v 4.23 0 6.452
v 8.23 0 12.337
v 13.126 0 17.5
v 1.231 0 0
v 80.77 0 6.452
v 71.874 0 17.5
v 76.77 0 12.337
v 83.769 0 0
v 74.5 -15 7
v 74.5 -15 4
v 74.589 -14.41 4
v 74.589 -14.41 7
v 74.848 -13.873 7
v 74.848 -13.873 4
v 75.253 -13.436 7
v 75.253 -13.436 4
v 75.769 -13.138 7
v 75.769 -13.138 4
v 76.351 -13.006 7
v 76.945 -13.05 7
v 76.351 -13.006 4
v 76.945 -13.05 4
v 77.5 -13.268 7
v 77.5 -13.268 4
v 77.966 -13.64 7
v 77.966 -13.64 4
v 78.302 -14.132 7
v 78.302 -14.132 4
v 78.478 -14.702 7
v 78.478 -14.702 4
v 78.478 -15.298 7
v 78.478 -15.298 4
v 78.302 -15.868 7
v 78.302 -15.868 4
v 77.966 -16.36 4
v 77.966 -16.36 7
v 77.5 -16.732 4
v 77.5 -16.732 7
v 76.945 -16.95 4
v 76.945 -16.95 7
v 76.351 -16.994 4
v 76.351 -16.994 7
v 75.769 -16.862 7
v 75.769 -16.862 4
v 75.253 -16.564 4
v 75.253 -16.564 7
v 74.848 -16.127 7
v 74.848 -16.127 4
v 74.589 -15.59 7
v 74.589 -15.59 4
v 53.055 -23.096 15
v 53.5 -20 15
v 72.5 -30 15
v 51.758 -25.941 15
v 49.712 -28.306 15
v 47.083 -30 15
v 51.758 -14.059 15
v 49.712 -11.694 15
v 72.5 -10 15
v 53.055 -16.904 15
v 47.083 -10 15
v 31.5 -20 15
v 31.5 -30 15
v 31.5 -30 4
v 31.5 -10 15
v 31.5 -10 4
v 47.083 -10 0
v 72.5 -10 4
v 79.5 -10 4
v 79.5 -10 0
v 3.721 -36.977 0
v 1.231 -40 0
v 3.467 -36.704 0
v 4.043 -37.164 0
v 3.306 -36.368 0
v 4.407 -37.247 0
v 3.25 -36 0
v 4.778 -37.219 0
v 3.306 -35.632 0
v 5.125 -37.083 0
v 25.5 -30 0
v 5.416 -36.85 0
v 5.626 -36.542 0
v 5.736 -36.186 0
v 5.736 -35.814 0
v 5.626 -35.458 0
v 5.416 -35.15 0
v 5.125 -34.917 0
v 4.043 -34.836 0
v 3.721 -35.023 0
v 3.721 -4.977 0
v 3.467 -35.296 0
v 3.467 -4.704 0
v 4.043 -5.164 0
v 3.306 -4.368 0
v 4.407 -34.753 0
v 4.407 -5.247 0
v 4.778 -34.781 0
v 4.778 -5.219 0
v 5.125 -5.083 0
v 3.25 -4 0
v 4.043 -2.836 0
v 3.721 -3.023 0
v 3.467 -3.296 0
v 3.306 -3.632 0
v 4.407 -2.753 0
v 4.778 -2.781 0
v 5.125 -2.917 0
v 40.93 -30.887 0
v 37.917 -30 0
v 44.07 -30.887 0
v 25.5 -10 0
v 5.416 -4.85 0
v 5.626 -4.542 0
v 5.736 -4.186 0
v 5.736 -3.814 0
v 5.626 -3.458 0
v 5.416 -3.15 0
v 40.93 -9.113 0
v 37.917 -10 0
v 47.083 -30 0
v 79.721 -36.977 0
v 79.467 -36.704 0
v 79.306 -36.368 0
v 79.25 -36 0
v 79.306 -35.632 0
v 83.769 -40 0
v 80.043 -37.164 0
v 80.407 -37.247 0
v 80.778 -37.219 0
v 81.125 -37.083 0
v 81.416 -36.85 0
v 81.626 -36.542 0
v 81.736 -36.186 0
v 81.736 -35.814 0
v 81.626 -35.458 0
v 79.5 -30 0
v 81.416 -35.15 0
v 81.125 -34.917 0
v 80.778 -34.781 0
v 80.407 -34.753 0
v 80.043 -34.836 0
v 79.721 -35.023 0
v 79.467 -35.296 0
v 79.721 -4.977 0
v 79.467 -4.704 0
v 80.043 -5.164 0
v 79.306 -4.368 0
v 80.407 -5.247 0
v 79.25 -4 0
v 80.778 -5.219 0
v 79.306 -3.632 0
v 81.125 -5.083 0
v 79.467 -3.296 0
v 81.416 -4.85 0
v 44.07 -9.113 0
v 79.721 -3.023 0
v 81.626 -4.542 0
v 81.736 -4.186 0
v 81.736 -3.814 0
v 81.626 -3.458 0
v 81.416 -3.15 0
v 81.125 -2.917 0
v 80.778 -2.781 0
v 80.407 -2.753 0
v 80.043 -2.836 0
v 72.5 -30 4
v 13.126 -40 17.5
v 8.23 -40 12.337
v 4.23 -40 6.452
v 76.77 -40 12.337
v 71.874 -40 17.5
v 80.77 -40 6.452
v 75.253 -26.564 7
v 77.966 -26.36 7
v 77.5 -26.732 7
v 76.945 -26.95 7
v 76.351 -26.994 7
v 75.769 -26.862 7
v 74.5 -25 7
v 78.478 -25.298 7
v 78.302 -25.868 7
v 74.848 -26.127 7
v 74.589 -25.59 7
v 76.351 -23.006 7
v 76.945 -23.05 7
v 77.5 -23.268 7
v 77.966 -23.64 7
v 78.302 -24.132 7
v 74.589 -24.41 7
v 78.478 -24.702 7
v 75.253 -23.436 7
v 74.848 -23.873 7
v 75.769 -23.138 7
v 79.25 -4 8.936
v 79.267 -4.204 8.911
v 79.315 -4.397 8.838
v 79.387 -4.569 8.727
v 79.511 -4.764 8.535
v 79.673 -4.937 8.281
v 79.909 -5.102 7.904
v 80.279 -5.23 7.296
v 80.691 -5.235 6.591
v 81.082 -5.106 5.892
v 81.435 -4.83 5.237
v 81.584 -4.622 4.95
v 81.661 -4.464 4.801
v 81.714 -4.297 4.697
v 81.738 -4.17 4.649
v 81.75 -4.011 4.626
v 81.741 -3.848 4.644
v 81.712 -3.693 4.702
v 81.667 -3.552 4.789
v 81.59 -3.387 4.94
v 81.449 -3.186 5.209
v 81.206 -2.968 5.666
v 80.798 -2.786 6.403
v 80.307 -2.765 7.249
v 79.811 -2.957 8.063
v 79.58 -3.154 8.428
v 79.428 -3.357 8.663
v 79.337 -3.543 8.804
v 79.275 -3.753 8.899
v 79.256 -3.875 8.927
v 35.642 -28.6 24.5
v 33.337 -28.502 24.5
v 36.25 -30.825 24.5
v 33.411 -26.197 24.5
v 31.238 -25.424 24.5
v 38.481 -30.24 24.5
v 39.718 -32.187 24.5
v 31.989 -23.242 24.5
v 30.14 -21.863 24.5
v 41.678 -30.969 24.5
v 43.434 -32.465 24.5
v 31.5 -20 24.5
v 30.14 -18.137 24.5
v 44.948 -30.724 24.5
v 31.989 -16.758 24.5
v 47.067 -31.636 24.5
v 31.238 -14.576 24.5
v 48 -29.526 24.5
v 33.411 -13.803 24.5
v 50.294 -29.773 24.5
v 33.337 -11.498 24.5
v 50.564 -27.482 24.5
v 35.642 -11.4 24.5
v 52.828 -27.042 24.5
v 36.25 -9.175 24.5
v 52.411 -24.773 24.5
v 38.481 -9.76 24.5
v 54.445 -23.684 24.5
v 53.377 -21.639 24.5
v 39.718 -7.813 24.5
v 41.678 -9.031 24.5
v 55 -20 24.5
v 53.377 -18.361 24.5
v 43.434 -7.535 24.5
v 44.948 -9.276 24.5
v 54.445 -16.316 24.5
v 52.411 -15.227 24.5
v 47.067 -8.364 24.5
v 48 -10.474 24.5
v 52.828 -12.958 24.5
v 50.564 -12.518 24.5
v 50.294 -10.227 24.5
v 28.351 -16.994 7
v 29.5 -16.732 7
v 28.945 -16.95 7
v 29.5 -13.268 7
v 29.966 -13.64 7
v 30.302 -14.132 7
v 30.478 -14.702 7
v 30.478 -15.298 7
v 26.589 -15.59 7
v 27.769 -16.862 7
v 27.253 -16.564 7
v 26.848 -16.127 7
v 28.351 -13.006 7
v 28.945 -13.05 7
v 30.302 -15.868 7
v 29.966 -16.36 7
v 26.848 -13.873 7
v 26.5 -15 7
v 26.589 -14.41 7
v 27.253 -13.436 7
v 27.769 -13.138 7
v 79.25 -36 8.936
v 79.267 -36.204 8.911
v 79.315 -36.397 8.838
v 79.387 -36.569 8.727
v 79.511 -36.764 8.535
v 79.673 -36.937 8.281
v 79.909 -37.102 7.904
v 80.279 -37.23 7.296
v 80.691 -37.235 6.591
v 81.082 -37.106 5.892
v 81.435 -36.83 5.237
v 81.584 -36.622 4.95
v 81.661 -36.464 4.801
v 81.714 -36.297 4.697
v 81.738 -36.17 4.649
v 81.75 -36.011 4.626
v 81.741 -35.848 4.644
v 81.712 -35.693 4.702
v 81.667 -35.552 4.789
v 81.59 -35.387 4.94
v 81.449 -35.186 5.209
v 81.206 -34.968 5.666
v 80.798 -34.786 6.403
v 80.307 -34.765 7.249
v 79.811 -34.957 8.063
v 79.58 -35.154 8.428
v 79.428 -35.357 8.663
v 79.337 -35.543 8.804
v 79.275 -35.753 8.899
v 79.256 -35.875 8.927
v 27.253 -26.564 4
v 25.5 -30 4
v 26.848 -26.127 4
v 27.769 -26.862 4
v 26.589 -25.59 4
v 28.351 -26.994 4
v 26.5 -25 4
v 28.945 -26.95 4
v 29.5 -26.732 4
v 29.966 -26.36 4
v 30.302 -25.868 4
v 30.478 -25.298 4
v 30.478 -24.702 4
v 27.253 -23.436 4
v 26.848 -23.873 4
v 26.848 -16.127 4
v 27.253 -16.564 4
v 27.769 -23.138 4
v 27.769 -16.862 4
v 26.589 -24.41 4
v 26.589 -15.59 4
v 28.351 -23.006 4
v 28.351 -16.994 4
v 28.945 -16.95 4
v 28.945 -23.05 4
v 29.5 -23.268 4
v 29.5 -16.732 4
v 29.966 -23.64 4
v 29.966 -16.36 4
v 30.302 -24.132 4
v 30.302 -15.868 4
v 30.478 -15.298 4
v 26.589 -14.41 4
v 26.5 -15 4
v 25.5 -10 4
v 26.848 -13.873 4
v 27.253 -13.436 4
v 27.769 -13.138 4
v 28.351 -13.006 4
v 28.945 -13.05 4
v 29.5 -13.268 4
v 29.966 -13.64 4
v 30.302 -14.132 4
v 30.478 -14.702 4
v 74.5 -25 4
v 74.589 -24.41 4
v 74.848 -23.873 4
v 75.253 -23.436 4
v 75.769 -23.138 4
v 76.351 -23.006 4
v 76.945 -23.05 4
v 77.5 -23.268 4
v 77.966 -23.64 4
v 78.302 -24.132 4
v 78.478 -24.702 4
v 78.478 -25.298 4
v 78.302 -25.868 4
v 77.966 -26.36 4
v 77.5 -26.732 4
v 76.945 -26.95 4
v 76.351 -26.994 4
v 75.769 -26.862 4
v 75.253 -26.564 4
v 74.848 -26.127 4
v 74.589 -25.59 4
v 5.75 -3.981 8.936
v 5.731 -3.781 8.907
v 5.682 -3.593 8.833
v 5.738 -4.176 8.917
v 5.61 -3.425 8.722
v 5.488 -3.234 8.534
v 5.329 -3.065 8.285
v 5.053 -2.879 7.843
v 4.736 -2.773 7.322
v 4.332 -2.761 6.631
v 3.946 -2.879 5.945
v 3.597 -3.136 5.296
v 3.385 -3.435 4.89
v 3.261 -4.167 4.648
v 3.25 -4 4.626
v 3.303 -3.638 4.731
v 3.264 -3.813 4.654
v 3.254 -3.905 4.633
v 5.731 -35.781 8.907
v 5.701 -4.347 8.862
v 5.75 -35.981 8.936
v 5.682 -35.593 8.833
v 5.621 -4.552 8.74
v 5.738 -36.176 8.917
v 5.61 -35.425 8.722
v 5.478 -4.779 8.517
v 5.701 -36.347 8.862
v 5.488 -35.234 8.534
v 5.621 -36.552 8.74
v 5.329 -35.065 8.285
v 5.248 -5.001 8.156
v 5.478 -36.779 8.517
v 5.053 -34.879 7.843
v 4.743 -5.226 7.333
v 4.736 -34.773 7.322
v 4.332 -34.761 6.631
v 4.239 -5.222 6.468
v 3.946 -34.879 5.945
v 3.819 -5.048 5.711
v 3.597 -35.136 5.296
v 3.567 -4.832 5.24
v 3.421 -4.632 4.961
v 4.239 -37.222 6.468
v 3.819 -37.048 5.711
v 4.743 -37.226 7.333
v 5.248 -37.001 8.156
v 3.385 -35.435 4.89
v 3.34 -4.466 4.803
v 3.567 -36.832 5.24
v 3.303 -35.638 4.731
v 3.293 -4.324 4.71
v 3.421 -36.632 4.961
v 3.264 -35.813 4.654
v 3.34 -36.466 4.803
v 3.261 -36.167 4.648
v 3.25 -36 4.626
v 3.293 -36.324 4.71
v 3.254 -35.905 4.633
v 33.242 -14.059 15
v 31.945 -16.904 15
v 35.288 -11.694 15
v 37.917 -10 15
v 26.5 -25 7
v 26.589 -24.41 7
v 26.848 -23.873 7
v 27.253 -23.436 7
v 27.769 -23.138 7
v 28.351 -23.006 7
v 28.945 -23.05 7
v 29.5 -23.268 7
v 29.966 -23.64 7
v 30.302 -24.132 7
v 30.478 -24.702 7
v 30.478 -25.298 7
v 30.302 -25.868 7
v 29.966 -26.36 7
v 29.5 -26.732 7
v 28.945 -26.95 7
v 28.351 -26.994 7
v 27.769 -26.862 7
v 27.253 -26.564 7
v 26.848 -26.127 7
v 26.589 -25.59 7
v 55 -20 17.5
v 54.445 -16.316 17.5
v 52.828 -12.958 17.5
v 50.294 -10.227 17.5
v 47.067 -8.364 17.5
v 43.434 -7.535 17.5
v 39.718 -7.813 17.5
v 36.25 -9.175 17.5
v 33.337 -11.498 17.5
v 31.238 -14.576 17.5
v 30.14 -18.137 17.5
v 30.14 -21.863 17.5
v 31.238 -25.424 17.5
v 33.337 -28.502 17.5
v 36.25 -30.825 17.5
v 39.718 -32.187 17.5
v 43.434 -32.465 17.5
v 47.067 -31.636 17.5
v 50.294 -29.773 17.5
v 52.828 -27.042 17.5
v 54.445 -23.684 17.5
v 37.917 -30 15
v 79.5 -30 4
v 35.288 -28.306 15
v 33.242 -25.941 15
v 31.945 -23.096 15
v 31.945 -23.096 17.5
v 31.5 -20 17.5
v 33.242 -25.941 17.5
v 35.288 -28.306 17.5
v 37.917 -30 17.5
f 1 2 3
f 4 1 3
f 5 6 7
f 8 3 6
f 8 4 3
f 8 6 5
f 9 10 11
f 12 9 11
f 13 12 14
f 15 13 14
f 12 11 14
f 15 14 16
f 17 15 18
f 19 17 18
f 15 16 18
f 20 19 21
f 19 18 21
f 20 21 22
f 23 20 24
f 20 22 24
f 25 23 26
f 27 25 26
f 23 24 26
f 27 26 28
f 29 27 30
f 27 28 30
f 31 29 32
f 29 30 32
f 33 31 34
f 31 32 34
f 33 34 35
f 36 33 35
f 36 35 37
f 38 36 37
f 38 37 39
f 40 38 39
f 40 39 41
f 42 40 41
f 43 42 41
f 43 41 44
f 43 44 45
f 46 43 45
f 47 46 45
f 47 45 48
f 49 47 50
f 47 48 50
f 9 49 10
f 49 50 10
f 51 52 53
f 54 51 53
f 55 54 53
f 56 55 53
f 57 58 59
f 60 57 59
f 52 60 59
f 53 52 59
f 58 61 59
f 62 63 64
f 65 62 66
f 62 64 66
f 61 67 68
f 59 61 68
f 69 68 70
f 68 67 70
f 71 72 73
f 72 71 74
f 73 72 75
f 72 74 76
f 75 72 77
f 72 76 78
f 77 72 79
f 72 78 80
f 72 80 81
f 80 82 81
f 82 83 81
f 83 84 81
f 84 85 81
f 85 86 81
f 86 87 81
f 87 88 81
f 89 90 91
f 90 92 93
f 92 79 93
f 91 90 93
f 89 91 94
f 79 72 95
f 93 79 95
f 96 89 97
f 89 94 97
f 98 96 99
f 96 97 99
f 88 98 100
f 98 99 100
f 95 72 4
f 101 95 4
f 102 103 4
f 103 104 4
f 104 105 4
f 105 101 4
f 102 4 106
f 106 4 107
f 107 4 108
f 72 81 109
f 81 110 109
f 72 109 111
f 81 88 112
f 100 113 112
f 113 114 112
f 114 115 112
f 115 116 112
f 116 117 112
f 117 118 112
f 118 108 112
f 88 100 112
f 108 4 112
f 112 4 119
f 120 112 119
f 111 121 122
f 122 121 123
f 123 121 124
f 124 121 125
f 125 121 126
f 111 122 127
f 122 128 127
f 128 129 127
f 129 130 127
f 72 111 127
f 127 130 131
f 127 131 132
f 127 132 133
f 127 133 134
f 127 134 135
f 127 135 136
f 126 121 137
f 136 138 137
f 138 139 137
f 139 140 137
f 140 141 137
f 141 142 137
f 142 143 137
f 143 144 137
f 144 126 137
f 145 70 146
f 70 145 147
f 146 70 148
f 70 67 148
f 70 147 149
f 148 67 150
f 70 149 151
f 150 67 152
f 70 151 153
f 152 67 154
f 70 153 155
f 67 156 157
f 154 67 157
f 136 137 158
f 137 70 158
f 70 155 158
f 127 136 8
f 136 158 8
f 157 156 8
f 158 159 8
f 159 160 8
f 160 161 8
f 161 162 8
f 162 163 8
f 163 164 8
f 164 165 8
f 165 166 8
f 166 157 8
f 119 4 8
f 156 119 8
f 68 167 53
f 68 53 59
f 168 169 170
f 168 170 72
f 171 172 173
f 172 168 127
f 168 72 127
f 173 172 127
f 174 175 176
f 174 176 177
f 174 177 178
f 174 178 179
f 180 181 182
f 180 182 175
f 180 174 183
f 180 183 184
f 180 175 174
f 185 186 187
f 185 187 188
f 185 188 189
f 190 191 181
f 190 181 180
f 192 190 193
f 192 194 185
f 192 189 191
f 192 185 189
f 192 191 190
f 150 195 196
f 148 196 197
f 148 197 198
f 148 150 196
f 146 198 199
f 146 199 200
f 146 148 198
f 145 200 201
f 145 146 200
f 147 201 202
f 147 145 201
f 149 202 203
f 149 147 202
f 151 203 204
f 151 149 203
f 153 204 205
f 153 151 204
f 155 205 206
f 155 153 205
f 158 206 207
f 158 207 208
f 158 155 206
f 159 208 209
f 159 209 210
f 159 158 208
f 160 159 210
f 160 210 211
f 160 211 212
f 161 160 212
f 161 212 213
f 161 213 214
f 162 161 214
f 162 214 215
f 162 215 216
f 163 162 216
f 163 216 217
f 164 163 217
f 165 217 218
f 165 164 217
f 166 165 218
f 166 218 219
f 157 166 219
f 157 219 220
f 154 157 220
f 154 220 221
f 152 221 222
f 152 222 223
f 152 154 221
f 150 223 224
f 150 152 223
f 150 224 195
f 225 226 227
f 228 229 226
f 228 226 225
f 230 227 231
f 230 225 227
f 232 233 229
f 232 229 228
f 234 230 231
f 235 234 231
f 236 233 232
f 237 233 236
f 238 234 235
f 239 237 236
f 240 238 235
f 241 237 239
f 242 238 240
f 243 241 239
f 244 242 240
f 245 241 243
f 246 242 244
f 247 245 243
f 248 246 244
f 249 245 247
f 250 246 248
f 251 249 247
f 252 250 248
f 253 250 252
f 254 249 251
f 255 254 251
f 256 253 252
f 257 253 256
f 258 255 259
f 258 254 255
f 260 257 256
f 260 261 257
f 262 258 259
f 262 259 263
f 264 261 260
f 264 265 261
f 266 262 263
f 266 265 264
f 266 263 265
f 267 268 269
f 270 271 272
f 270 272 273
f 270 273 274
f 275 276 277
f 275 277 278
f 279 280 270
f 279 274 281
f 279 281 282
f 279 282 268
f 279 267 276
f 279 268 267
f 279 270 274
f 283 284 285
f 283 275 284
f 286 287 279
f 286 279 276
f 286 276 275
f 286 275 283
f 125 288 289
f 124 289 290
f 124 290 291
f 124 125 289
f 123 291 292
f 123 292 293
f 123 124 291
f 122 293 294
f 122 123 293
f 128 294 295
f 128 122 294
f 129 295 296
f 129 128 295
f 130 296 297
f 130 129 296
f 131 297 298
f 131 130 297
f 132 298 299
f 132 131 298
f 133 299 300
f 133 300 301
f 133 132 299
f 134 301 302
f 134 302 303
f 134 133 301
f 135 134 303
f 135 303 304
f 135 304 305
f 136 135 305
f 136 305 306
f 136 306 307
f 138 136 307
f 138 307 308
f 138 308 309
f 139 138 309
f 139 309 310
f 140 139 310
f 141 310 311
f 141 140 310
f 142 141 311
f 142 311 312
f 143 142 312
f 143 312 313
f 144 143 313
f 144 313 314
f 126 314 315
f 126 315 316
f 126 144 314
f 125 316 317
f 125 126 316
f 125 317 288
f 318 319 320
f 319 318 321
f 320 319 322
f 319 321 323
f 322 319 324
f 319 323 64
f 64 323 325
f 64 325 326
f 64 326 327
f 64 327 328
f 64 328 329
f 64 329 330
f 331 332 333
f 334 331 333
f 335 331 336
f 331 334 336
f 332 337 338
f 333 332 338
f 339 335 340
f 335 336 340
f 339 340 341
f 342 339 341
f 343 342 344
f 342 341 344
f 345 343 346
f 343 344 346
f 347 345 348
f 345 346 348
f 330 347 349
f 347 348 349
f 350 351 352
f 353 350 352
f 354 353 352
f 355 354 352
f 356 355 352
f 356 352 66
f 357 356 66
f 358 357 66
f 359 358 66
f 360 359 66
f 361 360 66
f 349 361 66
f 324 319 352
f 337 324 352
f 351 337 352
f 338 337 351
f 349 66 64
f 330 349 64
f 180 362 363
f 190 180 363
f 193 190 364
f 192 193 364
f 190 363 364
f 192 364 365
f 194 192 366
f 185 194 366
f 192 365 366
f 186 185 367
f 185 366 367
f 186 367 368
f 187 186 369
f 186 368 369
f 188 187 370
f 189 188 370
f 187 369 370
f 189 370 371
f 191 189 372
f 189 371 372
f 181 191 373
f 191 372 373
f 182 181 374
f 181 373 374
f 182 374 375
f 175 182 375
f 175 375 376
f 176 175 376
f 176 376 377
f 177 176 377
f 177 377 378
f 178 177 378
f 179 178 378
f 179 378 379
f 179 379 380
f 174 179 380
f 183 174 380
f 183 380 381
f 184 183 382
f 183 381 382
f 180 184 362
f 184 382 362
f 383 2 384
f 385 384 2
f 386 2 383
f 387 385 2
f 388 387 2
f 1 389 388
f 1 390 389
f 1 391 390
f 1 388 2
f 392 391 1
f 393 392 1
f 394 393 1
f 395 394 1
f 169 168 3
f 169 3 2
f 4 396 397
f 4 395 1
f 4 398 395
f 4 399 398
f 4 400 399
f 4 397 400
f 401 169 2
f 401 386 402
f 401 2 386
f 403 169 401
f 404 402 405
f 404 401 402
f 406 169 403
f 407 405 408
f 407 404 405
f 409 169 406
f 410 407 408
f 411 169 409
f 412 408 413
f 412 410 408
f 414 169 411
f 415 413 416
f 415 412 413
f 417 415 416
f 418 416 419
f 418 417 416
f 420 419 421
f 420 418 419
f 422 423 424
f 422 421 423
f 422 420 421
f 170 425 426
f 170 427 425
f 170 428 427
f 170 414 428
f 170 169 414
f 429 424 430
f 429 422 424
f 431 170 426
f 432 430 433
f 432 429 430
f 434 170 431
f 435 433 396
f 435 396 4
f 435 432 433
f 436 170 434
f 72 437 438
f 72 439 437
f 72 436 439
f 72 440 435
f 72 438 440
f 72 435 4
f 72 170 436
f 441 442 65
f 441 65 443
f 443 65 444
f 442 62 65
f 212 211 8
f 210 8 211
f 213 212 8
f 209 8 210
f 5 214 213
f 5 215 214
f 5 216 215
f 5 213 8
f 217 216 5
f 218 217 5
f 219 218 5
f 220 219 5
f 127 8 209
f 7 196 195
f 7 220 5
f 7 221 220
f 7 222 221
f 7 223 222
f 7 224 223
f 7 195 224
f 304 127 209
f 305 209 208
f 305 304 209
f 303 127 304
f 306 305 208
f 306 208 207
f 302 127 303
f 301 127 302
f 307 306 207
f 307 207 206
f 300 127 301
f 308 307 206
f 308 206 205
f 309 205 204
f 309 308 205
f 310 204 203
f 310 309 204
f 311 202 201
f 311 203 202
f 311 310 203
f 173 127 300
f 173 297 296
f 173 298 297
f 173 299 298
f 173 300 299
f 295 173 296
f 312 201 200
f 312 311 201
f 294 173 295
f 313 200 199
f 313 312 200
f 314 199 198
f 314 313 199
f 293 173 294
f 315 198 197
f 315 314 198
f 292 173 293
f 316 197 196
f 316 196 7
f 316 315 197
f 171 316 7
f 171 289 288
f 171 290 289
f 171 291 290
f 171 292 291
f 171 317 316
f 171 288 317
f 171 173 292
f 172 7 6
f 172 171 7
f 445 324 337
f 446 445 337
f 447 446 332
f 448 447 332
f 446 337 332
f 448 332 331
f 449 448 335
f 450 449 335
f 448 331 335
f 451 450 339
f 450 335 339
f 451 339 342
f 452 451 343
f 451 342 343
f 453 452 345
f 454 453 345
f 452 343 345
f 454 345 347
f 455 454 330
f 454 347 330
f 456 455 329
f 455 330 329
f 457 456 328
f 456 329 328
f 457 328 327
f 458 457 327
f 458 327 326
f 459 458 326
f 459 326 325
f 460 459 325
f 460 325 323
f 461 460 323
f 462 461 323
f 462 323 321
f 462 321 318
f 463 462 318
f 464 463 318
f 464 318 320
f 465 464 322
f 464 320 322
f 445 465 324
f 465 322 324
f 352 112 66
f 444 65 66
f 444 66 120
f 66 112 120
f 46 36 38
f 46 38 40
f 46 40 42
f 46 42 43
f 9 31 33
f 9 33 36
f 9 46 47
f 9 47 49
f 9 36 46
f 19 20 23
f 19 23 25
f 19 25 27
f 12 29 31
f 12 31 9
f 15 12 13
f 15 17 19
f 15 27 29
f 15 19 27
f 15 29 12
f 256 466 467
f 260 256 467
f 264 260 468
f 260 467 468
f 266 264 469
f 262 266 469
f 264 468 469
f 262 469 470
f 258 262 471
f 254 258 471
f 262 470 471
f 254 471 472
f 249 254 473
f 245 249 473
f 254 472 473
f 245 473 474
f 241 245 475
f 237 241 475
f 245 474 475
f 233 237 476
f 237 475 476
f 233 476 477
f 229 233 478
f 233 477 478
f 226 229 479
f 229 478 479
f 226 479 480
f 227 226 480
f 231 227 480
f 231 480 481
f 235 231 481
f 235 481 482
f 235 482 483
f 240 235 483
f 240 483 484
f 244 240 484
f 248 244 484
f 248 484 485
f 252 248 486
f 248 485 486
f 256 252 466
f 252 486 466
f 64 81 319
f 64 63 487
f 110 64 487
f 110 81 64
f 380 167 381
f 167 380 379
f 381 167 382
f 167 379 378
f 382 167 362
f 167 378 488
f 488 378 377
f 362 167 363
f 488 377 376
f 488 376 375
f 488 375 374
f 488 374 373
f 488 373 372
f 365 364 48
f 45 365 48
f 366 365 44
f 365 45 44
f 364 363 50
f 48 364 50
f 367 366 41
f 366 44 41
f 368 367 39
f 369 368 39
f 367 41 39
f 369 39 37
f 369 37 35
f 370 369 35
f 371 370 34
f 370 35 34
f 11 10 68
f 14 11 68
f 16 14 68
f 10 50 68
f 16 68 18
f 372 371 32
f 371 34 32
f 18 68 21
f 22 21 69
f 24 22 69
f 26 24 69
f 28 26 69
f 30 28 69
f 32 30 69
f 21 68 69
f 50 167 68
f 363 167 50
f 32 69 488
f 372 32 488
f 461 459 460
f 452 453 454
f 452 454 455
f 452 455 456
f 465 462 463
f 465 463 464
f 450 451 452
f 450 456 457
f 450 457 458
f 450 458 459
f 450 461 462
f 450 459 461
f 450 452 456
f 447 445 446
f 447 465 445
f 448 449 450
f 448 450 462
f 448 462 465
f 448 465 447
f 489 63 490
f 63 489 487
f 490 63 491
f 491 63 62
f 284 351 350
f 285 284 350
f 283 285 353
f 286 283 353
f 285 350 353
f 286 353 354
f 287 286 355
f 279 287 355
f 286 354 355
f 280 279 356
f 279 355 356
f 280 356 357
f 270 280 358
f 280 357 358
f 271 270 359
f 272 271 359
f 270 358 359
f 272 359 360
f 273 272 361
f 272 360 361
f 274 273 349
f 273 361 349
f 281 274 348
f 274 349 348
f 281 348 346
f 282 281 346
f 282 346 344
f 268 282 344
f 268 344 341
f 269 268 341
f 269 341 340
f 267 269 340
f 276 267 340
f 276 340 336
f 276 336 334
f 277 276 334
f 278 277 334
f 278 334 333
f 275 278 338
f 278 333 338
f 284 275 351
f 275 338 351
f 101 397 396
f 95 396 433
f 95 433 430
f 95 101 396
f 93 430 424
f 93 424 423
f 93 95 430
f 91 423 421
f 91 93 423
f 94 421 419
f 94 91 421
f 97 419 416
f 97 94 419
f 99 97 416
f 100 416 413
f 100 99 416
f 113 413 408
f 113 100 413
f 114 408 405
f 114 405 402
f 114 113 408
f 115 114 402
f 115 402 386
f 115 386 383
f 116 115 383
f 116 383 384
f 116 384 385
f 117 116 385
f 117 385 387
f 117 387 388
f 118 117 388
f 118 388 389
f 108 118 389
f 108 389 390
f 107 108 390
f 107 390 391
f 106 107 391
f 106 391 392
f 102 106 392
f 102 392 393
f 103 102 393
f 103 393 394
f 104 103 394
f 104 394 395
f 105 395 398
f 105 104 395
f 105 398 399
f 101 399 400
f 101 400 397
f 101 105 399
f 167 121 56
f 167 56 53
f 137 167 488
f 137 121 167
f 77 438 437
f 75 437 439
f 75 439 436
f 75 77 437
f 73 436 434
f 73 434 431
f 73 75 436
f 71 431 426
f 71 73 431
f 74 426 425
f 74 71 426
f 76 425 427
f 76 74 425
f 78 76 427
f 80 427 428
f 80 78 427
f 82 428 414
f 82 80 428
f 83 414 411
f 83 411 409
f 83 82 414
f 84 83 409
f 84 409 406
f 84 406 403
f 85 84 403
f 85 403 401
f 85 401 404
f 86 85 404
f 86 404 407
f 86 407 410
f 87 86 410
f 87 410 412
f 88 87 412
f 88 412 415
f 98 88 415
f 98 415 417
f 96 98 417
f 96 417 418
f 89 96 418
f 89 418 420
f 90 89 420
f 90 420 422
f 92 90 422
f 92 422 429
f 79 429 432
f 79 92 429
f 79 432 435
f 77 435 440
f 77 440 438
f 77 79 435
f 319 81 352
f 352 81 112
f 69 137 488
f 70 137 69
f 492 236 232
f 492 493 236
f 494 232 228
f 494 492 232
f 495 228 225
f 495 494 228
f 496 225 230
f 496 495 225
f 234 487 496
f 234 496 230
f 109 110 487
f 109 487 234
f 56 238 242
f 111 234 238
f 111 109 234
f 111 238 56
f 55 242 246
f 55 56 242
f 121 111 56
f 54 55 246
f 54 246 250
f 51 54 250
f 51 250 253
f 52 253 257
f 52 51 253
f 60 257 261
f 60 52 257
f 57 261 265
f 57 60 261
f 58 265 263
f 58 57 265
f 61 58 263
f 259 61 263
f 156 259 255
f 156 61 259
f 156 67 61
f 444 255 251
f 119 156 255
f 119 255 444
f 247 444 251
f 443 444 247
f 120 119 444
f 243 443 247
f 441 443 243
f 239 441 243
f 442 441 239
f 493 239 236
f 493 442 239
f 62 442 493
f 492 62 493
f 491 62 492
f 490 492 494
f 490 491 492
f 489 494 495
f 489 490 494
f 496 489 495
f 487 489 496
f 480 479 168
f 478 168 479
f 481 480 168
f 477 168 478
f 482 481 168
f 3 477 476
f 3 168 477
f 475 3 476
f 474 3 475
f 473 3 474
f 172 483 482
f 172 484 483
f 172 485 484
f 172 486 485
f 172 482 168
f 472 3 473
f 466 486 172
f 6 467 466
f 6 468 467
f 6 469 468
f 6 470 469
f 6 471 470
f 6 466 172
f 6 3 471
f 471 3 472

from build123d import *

# Parameters (mm, degrees)
SKETCH_1_W           = 85
SKETCH_1_H           = 40
EXTRUDE_1_DEPTH      = 17.5
SKETCH_2_W           = 54
SKETCH_2_H           = 20
CUT_EXTRUDE_1_DEPTH  = 4
SKETCH_3_R           = 11
CUT_EXTRUDE_2_DEPTH  = 96.557574268
SKETCH_4_W           = 41
SKETCH_4_H           = 20
CUT_EXTRUDE_3_DEPTH  = 15
CUT_EXTRUDE_4_DEPTH  = 40
SKETCH_10_R          = 2
CUT_EXTRUDE_7_DEPTH  = 3
SKETCH_8_R           = 12.5
SKETCH_8_R_2         = 11
EXTRUDE_2_DEPTH      = 7
SKETCH_12_R          = 1.25
CUT_EXTRUDE_10_DEPTH = 97.007972017


with BuildPart() as part:
    # Эскиз1 → Бобышка-Вытянуть1 (new body)
    with BuildSketch(Plane.XY):
        with Locations((42.5, -20)):
            Rectangle(SKETCH_1_W, SKETCH_1_H)
    extrude(amount=EXTRUDE_1_DEPTH)

    # Эскиз2 → Вырез-Вытянуть1 (cut)
    with BuildSketch(Plane.XY):
        with Locations((52.5, -20)):
            Rectangle(SKETCH_2_W, SKETCH_2_H)
    extrude(amount=CUT_EXTRUDE_1_DEPTH, mode=Mode.SUBTRACT)

    # Эскиз3 → Вырез-Вытянуть2 (cut, through all)
    with BuildSketch(Plane.XY):
        with Locations(Location((42.5, -20, 0), (0, 0, 245.380022671))):
            Circle(SKETCH_3_R)
    extrude(amount=CUT_EXTRUDE_2_DEPTH, mode=Mode.SUBTRACT)

    # Эскиз4 → Вырез-Вытянуть3 (cut)
    with BuildSketch(Plane.XY):
        with Locations((52, -20)):
            Rectangle(SKETCH_4_W, SKETCH_4_H)
    extrude(amount=CUT_EXTRUDE_3_DEPTH, mode=Mode.SUBTRACT)

    # Эскиз6 → Вырез-Вытянуть4 (cut)
    with BuildSketch(Plane.XZ.offset(40)):
        with BuildLine():
            Line((0, 17.5), (13.126280648, 17.5))
            ThreePointArc((13.126280648, 17.5), (6.110875281, 9.475733473), (1.230789124, 0))
            Line((1.230789124, 0), (0, 0))
            Line((0, 0), (0, 17.5))
        make_face()
        with BuildLine():
            Line((71.873719352, 17.5), (85, 17.5))
            Line((85, 17.5), (85, 0))
            Line((85, 0), (83.769210876, 0))
            ThreePointArc((83.769210876, 0), (78.889124719, 9.475733473), (71.873719352, 17.5))
        make_face()
    extrude(amount=-CUT_EXTRUDE_4_DEPTH, mode=Mode.SUBTRACT)

    # Эскиз10 → Вырез-Вытянуть7 (cut)
    with BuildSketch(Plane(origin=(0, 0, 4), x_dir=(-1, 0, 0), z_dir=(0, 0, -1))):
        with Locations((-28.5, -15)):
            Circle(SKETCH_10_R)
        with Locations((-28.5, -25)):
            Circle(SKETCH_10_R)
        with Locations((-76.5, -15)):
            Circle(SKETCH_10_R)
        with Locations((-76.5, -25)):
            Circle(SKETCH_10_R)
    extrude(amount=-CUT_EXTRUDE_7_DEPTH, mode=Mode.SUBTRACT)

    # Эскиз8 → Бобышка-Вытянуть2 (add)
    with BuildSketch(Plane.XY.offset(17.5)):
        with Locations((42.5, -20)):
            Circle(SKETCH_8_R)
        with Locations(Location((42.5, -20, 0), (0, 0, 180))):
            Circle(SKETCH_8_R_2, mode=Mode.SUBTRACT)
    extrude(amount=EXTRUDE_2_DEPTH)

    # Эскиз12 → Вырез-Вытянуть10 (cut, through all)
    with BuildSketch(Plane.XY):
        with Locations(Location((80.5, -4, 0), (0, 0, 180))):
            Circle(SKETCH_12_R)
        with Locations(Location((80.5, -36, 0), (0, 0, 180))):
            Circle(SKETCH_12_R)
        with Locations(Location((4.5, -36, 0), (0, 0, 180))):
            Circle(SKETCH_12_R)
        with Locations(Location((4.5, -4, 0), (0, 0, 180))):
            Circle(SKETCH_12_R)
    extrude(amount=CUT_EXTRUDE_10_DEPTH, mode=Mode.SUBTRACT)


solid = part.part
